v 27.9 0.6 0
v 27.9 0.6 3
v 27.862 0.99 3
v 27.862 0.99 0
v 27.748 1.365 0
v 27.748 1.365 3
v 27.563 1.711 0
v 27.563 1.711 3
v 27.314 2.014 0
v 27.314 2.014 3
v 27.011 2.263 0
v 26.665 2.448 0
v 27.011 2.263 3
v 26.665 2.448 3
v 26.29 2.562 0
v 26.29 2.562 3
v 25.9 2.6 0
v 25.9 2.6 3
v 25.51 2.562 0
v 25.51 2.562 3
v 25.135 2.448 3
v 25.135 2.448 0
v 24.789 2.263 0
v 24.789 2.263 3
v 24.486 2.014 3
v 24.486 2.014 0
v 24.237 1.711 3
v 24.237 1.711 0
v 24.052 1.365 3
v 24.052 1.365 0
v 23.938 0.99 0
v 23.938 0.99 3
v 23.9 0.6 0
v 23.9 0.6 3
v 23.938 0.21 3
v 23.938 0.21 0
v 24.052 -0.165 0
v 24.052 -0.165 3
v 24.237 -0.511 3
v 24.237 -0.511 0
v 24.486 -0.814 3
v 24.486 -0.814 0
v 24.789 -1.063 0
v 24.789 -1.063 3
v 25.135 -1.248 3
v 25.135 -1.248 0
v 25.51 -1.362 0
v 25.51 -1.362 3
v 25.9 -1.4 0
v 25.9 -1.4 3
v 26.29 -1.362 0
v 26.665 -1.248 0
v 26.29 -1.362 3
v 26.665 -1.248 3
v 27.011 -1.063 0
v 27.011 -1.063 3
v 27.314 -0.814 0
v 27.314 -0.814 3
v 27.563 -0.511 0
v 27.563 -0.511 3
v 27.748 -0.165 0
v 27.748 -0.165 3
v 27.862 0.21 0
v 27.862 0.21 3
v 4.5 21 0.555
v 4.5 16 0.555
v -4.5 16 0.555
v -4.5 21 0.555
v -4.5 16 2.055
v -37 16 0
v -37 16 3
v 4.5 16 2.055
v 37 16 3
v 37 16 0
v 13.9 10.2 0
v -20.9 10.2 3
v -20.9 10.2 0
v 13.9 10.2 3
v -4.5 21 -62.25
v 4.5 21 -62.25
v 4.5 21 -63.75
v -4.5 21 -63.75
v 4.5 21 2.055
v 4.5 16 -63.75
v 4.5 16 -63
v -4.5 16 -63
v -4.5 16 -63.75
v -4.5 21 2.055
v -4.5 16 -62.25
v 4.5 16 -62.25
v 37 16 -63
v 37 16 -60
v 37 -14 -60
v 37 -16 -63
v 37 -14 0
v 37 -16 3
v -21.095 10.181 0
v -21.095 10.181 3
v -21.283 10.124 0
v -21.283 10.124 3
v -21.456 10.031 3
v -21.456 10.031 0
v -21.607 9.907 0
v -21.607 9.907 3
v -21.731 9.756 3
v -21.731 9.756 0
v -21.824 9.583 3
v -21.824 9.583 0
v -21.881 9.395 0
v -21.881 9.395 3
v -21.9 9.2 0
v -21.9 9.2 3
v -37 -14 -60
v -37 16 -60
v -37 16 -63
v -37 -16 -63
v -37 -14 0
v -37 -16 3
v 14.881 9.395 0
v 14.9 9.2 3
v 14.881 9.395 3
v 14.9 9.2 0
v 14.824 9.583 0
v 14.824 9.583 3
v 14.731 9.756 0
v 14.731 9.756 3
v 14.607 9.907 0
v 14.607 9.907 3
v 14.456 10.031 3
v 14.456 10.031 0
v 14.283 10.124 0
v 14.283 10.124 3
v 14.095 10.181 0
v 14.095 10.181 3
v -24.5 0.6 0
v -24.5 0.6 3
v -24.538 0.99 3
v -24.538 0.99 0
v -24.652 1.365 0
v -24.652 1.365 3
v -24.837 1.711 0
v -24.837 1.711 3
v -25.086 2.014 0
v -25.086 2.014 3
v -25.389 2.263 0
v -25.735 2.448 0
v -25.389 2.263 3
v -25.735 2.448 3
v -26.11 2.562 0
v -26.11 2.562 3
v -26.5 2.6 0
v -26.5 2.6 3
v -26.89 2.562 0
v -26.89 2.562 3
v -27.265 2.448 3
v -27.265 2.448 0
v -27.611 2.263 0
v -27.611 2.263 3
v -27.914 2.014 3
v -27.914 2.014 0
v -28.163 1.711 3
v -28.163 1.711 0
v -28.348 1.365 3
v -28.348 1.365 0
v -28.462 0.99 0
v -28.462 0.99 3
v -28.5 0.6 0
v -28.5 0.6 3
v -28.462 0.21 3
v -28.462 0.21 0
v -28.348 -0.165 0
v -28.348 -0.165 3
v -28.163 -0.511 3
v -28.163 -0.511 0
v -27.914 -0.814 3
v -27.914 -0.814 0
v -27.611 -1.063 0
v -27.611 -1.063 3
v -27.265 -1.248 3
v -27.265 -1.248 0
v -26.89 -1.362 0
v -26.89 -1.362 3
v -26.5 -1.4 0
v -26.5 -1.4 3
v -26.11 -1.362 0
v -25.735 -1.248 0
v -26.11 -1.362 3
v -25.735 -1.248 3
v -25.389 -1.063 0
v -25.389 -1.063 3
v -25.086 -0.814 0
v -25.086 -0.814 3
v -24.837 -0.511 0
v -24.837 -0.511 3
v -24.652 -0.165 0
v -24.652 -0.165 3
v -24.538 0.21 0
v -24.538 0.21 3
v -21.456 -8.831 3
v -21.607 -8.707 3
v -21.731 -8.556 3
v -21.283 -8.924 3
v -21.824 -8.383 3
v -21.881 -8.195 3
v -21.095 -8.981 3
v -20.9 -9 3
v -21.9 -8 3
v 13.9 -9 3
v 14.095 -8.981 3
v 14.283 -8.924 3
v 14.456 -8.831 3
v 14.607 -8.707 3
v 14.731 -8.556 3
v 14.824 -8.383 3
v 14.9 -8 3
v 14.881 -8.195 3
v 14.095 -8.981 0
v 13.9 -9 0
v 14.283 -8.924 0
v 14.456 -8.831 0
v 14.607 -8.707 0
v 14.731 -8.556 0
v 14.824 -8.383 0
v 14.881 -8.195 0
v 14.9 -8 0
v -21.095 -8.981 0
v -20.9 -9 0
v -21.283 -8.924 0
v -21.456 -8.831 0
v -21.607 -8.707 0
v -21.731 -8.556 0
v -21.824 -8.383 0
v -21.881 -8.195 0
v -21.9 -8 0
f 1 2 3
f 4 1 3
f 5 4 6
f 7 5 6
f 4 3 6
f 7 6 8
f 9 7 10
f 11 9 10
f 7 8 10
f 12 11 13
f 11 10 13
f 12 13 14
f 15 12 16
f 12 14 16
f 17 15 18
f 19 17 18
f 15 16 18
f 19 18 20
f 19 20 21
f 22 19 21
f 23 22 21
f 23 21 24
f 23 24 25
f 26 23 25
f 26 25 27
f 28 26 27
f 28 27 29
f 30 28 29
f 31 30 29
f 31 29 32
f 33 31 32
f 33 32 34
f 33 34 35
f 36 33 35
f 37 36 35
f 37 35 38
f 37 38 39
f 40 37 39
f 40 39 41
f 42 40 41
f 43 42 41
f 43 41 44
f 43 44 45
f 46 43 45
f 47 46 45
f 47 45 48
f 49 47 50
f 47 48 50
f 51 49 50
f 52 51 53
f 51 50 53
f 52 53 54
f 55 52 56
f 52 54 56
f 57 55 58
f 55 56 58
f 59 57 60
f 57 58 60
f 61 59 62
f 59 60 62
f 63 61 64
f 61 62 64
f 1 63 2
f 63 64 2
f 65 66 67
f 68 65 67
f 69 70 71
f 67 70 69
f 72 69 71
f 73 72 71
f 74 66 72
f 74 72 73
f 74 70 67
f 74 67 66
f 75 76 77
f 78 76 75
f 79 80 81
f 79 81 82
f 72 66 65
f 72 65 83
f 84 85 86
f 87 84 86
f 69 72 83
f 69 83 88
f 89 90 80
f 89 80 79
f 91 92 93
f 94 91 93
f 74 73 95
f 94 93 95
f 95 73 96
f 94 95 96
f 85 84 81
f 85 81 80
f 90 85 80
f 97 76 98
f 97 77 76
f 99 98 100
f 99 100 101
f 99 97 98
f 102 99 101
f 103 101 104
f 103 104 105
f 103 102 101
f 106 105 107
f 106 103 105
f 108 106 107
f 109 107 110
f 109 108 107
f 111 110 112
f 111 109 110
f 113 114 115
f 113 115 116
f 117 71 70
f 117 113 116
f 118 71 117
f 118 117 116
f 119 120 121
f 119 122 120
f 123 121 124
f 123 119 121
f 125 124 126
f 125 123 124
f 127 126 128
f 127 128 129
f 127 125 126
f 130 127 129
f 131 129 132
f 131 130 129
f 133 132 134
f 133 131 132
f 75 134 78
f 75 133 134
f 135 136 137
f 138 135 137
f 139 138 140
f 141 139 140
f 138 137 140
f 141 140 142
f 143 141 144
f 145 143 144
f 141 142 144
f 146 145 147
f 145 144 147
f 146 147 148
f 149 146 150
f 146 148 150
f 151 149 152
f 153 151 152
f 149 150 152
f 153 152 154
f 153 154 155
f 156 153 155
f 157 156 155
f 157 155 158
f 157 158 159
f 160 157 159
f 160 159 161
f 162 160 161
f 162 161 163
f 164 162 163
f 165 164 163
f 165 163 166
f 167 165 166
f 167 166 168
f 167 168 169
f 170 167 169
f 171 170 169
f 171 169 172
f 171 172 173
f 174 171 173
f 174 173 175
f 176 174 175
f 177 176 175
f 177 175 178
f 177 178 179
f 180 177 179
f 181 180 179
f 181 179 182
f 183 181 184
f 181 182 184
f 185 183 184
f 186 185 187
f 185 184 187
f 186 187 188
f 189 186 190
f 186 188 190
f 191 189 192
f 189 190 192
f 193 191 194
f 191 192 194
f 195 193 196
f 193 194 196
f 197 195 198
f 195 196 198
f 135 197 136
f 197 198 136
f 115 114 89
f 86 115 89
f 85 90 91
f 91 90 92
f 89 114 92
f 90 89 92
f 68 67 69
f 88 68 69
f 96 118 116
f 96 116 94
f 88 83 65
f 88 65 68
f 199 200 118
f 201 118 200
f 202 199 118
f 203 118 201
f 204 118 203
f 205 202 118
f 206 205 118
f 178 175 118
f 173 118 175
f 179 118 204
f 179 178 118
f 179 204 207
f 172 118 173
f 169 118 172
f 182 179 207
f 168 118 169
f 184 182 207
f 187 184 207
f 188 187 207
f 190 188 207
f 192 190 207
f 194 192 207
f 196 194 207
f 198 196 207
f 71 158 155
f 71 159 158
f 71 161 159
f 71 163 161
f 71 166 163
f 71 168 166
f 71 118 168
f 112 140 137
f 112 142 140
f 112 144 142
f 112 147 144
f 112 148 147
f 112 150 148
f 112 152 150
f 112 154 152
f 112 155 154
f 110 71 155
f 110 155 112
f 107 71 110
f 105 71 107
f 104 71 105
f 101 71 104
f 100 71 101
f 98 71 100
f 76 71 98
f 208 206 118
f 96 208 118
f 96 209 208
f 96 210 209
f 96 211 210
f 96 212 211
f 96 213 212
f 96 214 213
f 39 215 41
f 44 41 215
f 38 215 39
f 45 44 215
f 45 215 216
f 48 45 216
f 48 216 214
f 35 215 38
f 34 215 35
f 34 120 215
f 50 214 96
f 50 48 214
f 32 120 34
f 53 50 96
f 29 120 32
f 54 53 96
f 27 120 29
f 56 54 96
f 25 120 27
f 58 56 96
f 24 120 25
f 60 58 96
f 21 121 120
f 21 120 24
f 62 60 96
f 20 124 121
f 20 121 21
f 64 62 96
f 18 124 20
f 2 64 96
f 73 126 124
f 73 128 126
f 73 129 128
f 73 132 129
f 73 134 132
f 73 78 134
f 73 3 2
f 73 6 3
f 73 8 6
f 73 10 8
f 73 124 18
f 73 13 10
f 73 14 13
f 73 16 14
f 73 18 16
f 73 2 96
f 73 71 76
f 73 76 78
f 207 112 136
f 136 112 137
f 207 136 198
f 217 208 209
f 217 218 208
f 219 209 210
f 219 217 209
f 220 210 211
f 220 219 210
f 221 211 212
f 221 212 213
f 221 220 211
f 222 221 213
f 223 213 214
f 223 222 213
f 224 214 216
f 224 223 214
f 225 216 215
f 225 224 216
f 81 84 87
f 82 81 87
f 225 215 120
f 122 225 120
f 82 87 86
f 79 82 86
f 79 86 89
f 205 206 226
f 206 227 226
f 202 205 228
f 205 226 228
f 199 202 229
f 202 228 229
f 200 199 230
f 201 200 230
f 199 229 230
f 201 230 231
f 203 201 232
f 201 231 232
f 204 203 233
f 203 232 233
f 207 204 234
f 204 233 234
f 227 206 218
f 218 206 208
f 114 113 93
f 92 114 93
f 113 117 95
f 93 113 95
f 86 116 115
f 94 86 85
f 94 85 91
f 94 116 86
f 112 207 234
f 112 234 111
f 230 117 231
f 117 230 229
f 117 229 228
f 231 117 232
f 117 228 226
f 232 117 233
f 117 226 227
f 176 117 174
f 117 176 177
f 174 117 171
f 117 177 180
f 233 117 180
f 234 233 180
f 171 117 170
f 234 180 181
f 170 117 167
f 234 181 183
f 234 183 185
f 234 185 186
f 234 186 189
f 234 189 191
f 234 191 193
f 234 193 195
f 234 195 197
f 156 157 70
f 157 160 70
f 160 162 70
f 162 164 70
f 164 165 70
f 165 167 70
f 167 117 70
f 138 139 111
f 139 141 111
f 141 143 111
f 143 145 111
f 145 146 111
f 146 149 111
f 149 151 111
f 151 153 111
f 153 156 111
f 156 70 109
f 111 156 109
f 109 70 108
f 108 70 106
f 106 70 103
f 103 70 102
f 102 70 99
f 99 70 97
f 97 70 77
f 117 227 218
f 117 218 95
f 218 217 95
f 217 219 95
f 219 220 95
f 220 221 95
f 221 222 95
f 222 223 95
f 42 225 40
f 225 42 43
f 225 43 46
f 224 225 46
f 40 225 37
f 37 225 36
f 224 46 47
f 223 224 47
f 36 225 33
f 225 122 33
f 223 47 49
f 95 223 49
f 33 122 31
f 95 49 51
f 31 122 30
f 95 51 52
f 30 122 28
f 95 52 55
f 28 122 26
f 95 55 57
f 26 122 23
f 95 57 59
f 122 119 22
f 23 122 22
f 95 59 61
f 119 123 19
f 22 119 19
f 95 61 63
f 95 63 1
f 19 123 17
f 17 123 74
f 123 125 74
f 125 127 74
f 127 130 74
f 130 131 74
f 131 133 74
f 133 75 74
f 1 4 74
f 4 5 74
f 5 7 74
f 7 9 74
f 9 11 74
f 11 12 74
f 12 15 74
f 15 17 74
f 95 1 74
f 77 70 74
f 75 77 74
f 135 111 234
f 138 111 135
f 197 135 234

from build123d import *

# Parameters (mm, degrees)
F0_W      = 74
F0_H      = 32
F1_DEPTH  = 3
F2_W      = 36.8
F2_H      = 19.2
F3_DEPTH  = 3
F4_R      = 1
F5_R      = 2
F6_DEPTH  = 25
F7_W      = 9
F7_H      = 1.5
F8_DEPTH  = 5
F9_W      = 74
F9_H      = 2
F10_DEPTH = 60
F11_W     = 74
F11_H     = 32
F12_DEPTH = 3
F13_W     = 9
F13_H     = 1.5
F14_DEPTH = 5


with BuildPart() as f1:
    # F0 (on Top) → F1 (new body)
    with BuildSketch(Plane.XY):
        Rectangle(F0_W, F0_H)
    extrude(amount=F1_DEPTH)

    # F2 (on face) → F3 (cut, through all)
    with BuildSketch(Plane.XY.offset(3)):
        with Locations((-3.5, 0.6)):
            Rectangle(F2_W, F2_H)
    extrude(amount=-F3_DEPTH, mode=Mode.SUBTRACT)

    # F4
    f4_edges = [f1.edges().sort_by_distance(p)[0] for p in [
        (-21.9, 10.2, 1.5),
        (-21.9, -9, 1.5),
        (14.9, 10.2, 1.5),
        (14.9, -9, 1.5),
    ]]
    fillet(f4_edges, radius=F4_R)

    # F5 (on face) → F6 (cut)
    with BuildSketch(Plane.XY.offset(3)):
        with Locations((-26.5, 0.6)):
            Circle(F5_R)
        with Locations((25.9, 0.6)):
            Circle(F5_R)
    extrude(amount=-F6_DEPTH, mode=Mode.SUBTRACT)

    # F7 (on face) → F8 (join)
    with BuildSketch(Plane(origin=(0, 16, 0), x_dir=(-1, 0, 0), z_dir=(0, 1, 0))):
        with Locations((0, 1.305378)):
            Rectangle(F7_W, F7_H)
    extrude(amount=F8_DEPTH)

    # F9 (on face) → F10 (join)
    with BuildSketch(Plane(origin=(0, 0, 0), x_dir=(1, 0, 0), z_dir=(0, 0, -1))):
        with Locations((0, 15)):
            Rectangle(F9_W, F9_H)
    extrude(amount=F10_DEPTH)

    # F11 (on face) → F12 (join)
    with BuildSketch(Plane(origin=(0, 0, -60), x_dir=(1, 0, 0), z_dir=(0, 0, -1))):
        Rectangle(F11_W, F11_H)
    extrude(amount=F12_DEPTH)

    # F13 (on face) → F14 (join)
    with BuildSketch(Plane(origin=(0, 16, 0), x_dir=(-1, 0, 0), z_dir=(0, 1, 0))):
        with Locations((0, -63)):
            Rectangle(F13_W, F13_H)
    extrude(amount=F14_DEPTH)


solid = f1.part
